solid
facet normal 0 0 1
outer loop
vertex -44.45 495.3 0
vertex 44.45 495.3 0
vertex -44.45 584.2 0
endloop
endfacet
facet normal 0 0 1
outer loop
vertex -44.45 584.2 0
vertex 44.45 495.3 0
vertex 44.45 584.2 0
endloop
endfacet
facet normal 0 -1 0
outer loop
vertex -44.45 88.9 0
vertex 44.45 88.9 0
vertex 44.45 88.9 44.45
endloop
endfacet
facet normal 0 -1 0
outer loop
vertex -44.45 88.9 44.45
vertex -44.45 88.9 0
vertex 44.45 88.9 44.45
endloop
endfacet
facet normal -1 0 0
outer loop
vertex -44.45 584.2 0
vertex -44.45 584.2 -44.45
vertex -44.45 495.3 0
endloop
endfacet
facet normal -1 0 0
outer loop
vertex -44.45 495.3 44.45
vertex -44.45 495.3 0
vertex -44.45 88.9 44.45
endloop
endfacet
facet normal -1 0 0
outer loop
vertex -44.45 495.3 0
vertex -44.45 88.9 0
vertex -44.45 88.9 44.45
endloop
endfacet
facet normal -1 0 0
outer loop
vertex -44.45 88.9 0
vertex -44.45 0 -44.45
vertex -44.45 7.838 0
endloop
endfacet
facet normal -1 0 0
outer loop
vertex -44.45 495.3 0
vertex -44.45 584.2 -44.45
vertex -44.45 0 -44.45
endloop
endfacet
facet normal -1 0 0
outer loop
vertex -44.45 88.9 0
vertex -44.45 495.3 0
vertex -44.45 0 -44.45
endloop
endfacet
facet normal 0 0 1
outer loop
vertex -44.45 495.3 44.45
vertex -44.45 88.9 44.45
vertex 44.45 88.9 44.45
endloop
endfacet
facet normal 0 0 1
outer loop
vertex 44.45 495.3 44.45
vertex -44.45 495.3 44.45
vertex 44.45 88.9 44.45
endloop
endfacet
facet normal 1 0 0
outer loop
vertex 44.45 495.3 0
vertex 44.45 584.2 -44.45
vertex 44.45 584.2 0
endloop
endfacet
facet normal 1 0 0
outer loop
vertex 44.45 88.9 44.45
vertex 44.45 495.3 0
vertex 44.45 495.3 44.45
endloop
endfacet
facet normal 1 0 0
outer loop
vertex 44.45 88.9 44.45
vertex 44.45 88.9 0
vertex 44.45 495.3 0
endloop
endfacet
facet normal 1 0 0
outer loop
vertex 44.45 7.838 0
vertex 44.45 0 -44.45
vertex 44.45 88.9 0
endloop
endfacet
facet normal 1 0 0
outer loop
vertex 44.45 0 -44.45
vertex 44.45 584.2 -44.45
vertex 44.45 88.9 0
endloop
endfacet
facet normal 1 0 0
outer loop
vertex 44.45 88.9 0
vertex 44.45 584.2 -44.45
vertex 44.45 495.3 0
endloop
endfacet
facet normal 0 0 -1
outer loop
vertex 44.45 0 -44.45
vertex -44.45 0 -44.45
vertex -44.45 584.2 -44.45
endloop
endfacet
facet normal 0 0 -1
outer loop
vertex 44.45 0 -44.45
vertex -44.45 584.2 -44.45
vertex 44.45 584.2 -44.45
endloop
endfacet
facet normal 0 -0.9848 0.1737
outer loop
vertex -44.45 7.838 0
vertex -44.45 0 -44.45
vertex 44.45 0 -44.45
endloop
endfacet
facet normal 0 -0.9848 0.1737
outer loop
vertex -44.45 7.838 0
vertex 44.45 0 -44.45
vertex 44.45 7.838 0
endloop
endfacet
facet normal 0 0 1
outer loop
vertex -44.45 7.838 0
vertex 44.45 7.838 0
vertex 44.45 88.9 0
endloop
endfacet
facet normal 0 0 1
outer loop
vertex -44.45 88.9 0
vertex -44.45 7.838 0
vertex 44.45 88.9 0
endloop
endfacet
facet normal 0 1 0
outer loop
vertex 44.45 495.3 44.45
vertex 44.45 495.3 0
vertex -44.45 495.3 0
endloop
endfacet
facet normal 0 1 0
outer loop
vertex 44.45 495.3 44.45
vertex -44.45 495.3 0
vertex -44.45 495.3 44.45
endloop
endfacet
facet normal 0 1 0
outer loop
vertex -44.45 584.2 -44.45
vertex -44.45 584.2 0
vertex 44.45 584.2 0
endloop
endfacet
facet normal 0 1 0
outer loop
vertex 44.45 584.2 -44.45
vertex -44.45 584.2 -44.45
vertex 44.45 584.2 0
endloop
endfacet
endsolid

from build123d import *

# Parameters (mm, degrees)
F0_W     = 88.9
F0_H     = 88.9
F1_DEPTH = 584.2
F2_W     = 88.9
F2_H     = 44.45
F3_DEPTH = 88.901
F5_DEPTH = 88.901


with BuildPart() as f1:
    # F0 (on Front) → F1 (new body)
    with BuildSketch(Plane.XZ):
        Rectangle(F0_W, F0_H)
    extrude(amount=-F1_DEPTH)

    # F2 (on face) → F3 (cut, through all)
    with BuildSketch(Plane.YZ.offset(44.45)):
        with Locations((44.45, 22.225)):
            Rectangle(F2_W, F2_H)
        with Locations((539.75, 22.225)):
            Rectangle(F2_W, F2_H)
    extrude(amount=-F3_DEPTH, mode=Mode.SUBTRACT)

    # F4 (on face) → F5 (cut, through all)
    with BuildSketch(Plane.YZ.offset(44.45)):
        Polygon((0, 0), (0, -44.45), (7.837734, 0), align=None)
    extrude(amount=-F5_DEPTH, mode=Mode.SUBTRACT)


solid = f1.part
